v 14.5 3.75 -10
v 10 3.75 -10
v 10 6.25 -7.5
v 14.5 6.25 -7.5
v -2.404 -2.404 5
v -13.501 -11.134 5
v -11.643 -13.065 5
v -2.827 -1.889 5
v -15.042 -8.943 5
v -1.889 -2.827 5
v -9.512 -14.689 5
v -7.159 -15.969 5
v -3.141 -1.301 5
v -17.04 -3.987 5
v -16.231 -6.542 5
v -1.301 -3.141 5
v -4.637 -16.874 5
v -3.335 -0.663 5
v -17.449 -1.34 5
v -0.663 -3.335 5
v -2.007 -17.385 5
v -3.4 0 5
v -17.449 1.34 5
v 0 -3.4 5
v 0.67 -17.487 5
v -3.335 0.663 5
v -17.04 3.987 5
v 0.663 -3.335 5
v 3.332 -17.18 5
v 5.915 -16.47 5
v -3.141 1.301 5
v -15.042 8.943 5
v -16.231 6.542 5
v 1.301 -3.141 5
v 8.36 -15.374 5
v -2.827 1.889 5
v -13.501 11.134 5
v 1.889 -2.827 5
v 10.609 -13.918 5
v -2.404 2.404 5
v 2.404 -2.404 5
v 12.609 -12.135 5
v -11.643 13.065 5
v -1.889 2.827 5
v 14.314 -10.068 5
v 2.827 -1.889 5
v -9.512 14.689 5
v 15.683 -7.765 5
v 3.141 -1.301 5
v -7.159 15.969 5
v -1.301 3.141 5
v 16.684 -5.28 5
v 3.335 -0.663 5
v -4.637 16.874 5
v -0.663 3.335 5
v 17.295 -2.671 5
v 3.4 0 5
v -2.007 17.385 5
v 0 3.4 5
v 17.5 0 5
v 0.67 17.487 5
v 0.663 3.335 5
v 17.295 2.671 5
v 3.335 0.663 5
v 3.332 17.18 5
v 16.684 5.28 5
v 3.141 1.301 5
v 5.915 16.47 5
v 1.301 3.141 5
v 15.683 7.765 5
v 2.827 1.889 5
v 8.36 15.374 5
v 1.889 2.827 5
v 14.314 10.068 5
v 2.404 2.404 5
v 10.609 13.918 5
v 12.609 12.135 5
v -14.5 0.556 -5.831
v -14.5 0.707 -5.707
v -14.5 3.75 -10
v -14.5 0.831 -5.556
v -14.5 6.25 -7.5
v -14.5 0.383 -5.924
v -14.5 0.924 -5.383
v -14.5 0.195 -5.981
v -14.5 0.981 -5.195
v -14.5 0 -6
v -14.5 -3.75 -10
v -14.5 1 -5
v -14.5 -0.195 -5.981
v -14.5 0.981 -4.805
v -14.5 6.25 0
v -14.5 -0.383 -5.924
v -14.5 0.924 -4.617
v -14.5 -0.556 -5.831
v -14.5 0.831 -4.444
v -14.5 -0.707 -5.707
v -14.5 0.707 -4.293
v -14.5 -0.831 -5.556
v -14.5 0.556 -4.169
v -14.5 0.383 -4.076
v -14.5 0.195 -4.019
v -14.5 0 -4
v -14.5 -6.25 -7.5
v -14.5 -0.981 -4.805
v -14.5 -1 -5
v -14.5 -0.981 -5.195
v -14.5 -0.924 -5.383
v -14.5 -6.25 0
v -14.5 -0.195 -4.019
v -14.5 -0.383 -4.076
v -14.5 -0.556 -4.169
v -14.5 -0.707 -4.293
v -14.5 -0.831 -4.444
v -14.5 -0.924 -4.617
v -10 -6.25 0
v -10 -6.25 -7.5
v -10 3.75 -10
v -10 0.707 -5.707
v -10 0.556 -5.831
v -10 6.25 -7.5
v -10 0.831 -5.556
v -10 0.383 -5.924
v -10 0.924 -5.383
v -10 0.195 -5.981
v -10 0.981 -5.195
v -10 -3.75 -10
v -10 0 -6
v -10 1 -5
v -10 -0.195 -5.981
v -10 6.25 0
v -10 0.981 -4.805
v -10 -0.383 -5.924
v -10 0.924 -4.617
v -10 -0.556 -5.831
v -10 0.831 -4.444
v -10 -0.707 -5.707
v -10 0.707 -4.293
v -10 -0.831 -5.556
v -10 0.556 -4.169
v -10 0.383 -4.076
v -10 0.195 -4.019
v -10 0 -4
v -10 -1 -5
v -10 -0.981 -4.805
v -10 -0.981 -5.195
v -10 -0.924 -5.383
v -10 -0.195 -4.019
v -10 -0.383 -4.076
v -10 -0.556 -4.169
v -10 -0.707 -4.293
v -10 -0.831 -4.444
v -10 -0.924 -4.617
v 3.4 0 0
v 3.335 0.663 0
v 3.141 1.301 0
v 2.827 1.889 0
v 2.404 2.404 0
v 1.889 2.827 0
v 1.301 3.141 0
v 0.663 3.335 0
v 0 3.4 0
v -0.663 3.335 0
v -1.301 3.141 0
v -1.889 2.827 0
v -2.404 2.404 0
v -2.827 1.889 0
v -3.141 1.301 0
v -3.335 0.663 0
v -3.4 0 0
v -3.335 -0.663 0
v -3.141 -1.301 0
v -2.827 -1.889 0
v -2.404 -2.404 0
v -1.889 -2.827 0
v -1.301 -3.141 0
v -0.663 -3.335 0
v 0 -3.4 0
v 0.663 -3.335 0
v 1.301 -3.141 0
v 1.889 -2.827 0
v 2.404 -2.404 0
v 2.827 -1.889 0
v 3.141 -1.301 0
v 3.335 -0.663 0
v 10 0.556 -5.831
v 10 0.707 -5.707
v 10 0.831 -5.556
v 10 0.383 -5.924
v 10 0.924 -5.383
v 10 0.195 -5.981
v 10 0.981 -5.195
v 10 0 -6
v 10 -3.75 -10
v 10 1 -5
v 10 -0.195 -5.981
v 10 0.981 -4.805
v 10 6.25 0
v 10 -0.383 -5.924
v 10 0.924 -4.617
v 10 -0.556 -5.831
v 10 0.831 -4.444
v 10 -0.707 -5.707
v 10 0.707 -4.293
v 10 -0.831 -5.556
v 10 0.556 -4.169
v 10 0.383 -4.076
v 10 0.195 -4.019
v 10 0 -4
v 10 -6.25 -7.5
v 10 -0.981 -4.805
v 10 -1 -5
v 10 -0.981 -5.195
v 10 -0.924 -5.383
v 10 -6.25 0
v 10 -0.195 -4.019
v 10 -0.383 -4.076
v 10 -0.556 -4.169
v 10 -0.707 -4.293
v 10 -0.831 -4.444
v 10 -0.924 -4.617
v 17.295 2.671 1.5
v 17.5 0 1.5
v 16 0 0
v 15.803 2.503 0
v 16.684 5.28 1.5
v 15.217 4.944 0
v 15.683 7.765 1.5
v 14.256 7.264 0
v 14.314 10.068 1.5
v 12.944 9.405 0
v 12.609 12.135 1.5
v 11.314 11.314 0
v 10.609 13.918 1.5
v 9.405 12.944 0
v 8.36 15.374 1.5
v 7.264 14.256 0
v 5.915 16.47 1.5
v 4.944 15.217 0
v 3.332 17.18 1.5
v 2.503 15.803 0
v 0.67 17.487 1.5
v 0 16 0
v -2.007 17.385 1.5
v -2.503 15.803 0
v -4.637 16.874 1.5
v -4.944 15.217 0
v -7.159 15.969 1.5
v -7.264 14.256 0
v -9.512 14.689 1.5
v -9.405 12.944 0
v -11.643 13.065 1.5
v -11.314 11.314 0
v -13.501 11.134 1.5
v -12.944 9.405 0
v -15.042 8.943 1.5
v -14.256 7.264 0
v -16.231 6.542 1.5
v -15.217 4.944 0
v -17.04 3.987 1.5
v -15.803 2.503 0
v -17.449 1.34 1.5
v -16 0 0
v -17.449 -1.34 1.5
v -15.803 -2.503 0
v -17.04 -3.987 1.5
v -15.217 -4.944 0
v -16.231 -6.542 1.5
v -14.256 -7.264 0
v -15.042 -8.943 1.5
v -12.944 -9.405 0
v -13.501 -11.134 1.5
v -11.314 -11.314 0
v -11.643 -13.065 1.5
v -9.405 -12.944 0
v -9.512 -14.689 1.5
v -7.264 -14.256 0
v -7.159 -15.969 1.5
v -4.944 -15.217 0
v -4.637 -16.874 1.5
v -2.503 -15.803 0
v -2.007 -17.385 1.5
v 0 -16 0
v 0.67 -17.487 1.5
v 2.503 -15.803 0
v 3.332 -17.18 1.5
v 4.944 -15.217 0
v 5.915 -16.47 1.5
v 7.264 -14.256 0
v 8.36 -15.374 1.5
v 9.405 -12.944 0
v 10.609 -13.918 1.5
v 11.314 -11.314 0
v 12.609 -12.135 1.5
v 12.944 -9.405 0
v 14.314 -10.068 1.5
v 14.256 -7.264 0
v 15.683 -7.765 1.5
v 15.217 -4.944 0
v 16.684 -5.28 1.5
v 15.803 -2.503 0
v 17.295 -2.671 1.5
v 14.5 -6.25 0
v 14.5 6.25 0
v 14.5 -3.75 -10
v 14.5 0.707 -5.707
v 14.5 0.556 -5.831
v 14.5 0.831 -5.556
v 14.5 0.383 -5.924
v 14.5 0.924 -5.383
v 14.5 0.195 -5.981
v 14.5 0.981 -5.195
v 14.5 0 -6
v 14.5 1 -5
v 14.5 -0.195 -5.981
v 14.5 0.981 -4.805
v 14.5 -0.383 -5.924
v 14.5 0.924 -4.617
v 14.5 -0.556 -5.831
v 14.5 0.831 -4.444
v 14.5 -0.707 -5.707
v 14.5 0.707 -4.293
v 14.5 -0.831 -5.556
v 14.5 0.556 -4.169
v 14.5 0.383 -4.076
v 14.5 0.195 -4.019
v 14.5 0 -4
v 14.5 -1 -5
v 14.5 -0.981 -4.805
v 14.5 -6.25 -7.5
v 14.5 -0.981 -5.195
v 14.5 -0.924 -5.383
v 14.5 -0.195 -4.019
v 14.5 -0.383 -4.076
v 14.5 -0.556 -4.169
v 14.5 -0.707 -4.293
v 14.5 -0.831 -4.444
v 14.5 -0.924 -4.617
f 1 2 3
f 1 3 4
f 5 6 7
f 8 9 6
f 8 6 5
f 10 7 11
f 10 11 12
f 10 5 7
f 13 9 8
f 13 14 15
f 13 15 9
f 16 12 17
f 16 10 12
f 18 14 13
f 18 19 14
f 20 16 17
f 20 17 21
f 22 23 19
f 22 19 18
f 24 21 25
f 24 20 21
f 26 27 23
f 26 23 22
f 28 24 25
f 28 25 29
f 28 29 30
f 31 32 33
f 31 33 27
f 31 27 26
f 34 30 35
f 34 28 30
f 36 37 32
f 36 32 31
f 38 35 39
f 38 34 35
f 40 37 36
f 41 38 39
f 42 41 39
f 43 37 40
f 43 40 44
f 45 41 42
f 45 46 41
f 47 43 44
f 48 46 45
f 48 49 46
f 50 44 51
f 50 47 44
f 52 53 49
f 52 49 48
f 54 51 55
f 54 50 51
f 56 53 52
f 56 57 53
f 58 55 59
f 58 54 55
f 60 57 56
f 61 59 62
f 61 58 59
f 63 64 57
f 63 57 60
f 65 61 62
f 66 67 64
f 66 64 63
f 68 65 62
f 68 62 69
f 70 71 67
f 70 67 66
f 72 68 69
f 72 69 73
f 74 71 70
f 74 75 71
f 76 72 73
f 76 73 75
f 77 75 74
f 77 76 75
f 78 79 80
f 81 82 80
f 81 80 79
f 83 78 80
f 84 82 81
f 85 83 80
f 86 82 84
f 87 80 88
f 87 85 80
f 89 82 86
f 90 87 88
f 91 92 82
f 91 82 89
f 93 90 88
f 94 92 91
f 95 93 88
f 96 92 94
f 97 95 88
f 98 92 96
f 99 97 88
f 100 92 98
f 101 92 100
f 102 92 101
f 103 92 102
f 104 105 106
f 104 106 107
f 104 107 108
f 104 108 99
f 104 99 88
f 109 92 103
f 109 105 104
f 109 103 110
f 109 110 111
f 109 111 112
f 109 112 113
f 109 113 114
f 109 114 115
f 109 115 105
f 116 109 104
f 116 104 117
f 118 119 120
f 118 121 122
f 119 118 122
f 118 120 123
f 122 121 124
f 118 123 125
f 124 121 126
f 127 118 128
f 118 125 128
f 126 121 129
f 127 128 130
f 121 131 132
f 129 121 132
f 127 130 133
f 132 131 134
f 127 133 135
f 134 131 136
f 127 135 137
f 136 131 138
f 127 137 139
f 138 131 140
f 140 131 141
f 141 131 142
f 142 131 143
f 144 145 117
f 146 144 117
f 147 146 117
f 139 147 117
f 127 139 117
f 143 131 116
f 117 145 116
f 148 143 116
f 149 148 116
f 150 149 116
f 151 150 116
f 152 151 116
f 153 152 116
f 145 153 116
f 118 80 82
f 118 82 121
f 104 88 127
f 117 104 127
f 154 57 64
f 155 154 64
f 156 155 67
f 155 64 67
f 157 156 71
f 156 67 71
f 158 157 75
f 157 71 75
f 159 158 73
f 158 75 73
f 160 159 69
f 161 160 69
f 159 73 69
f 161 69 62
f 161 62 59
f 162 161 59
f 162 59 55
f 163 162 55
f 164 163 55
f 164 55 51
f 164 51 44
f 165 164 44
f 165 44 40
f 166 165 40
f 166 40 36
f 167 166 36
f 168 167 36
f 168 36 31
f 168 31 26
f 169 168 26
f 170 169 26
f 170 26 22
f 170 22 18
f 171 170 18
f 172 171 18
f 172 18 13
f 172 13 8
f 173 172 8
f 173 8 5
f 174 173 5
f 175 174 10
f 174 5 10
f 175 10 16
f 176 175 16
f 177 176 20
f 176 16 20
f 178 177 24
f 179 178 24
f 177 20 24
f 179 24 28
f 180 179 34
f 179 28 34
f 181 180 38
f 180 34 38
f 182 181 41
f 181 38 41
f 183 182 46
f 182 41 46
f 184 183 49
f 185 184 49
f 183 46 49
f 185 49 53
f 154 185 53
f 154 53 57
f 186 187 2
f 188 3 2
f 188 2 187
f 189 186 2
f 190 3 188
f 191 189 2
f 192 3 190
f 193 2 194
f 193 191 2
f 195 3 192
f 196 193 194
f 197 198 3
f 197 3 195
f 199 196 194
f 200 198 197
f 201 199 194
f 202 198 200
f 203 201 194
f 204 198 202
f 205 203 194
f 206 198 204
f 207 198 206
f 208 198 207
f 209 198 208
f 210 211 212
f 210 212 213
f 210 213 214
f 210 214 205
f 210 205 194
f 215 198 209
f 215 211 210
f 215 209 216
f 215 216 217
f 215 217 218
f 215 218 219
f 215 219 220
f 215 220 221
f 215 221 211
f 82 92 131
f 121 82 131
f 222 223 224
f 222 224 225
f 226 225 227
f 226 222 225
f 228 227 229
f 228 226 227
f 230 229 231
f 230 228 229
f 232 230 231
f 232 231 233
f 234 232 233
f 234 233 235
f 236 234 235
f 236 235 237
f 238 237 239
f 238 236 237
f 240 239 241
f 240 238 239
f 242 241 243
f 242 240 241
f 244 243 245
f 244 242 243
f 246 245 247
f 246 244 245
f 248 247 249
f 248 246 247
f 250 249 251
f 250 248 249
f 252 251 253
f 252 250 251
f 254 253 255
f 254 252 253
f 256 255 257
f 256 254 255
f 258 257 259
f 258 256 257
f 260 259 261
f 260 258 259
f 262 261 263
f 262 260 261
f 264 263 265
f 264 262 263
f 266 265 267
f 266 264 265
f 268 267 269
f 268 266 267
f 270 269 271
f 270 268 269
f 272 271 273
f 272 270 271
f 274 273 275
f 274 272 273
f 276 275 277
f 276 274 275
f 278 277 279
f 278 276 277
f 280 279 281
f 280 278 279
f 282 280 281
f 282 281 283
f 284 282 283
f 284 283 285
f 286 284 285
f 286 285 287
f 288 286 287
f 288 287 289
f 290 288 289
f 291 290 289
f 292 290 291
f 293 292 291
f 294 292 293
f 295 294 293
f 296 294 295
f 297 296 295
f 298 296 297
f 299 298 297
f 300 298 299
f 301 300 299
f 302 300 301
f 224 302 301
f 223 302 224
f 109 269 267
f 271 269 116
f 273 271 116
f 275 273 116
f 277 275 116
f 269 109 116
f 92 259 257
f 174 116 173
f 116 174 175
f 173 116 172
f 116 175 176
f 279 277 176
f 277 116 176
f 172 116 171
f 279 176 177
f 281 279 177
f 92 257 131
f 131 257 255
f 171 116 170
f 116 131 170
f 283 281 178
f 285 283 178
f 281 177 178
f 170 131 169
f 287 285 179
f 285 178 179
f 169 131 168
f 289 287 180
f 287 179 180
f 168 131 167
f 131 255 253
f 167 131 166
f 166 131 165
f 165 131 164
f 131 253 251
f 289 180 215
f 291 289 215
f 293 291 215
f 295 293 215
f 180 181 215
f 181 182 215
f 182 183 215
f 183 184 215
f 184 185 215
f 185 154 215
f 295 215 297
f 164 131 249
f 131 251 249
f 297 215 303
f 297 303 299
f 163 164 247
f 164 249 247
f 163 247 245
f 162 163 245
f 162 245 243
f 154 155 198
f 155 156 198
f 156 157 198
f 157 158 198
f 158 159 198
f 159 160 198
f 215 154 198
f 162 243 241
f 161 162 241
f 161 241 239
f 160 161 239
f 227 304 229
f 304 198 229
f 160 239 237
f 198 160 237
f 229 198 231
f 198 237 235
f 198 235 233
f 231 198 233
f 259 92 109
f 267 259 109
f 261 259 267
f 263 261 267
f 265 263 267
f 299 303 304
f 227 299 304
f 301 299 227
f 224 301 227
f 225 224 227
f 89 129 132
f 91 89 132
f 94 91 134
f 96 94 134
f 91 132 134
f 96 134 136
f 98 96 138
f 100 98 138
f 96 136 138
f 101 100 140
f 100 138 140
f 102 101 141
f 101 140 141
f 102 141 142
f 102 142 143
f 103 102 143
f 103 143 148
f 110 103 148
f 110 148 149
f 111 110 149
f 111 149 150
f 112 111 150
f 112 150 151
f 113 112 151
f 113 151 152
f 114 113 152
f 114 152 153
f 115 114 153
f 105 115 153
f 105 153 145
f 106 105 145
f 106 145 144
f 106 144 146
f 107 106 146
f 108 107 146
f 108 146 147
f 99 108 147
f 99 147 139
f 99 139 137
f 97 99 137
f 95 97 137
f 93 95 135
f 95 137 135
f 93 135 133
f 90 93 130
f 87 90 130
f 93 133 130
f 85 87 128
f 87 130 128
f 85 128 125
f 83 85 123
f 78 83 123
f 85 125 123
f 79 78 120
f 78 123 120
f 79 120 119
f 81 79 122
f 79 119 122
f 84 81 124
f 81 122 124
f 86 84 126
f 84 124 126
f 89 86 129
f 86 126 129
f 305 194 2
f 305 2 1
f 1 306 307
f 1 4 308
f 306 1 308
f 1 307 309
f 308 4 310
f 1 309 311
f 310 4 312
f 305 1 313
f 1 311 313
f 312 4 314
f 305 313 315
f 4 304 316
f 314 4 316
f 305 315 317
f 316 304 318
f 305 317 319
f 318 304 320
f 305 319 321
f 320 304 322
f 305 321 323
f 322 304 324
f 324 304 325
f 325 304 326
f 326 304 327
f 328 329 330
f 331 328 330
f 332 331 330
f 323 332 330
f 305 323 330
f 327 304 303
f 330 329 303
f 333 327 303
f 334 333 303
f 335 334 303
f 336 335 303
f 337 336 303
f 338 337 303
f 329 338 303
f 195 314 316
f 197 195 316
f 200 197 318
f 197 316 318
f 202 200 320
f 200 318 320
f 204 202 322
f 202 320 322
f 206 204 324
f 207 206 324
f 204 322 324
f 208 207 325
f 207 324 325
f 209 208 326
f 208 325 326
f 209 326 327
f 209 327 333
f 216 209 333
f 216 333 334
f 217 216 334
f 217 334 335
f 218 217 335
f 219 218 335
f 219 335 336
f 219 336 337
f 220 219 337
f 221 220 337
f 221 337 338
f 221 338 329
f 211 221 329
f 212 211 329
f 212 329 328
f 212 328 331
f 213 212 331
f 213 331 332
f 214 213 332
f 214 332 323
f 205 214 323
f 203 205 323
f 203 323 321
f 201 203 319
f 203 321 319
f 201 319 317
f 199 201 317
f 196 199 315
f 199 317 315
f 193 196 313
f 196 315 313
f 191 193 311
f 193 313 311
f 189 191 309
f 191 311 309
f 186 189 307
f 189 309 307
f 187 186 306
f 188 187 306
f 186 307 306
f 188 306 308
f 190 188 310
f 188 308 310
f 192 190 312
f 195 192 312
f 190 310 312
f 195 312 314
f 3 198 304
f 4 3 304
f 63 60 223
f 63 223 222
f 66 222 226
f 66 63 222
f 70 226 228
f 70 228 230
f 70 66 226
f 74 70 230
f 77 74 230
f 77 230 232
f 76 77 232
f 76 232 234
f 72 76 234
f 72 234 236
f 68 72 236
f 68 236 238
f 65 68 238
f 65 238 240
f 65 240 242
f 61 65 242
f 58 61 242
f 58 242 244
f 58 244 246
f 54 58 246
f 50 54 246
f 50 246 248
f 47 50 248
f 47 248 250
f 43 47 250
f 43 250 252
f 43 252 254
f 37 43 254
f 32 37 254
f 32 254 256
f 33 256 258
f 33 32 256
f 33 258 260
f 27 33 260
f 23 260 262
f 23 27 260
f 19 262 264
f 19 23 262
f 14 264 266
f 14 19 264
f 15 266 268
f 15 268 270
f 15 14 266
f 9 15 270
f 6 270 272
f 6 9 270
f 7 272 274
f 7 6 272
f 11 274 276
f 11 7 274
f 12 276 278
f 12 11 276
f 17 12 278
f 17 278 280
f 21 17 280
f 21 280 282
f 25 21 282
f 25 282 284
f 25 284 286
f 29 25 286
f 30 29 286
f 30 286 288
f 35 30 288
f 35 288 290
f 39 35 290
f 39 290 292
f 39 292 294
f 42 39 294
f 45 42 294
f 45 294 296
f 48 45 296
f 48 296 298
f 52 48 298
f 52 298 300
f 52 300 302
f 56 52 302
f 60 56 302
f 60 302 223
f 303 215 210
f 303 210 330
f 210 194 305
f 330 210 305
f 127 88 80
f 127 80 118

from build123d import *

# Parameters (mm, degrees)
F1_DEPTH  = 5
F3_SIZE   = 1
F2_W      = 4.5
F2_H      = 12.5
F4_DEPTH  = 10
F5_SIZE   = 2.5
F6_R      = 1
F7_DEPTH  = 39.5010001
F8_R      = 39.5864097355
F8_R_2    = 17.5
F9_DEPTH  = 25
F10_SIZE  = 1.5
F11_R     = 3.4
F12_DEPTH = 25


with BuildPart() as f1:
    # F0 (on Top) → F1 (new body)
    with BuildSketch(Plane.XY):
        with BuildLine():
            ThreePointArc((19.8625961196, -15.8301909188), (23.6080012184, -12.5093598908), (25, -7.7012087429))
            Line((25, -7.7012087429), (25, 7.7012087429))
            ThreePointArc((25, 7.7012087429), (23.6080012184, 12.5093598908), (19.8625961196, 15.8301909188))
            add(Edge.make_bspline(
                [(19.8625961196, 15.8301909188), (0, 25.2681728257), (-19.8625961196, 15.8301909188)],
                knots=[0.9132750433, 0.9132750433, 0.9132750433, 2.2283176103, 2.2283176103, 2.2283176103], degree=2, weights=[1, 0.7915095459, 1]))
            ThreePointArc((-19.8625961196, 15.8301909188), (-23.6080012184, 12.5093598908), (-25, 7.7012087429))
            Line((-25, 7.7012087429), (-25, -7.7012087429))
            ThreePointArc((-25, -7.7012087429), (-23.6080012184, -12.5093598908), (-19.8625961196, -15.8301909188))
            add(Edge.make_bspline(
                [(-19.8625961196, -15.8301909188), (0, -25.2681728257), (19.8625961196, -15.8301909188)],
                knots=[4.0548676969, 4.0548676969, 4.0548676969, 5.3699102639, 5.3699102639, 5.3699102639], degree=2, weights=[1, 0.7915095459, 1]))
        make_face()
    extrude(amount=F1_DEPTH)

    # F3
    f3_edges = [f1.edges().sort_by_distance(p)[0] for p in [
        (4e-06, -20, 0),
    ]]
    chamfer(f3_edges, length=F3_SIZE)

    # F2 (on face) → F4 (join)
    with BuildSketch(Plane(origin=(0, 0, 0), x_dir=(1, 0, 0), z_dir=(0, 0, -1))):
        with Locations((12.25, 0)):
            Rectangle(F2_W, F2_H)
        with Locations((-12.25, 0)):
            Rectangle(F2_W, F2_H)
    extrude(amount=F4_DEPTH)

    # F5
    f5_edges = [f1.edges().sort_by_distance(p)[0] for p in [
        (-12.25, -6.25, -10),
        (12.25, -6.25, -10),
        (-12.25, 6.25, -10),
        (12.25, 6.25, -10),
    ]]
    chamfer(f5_edges, length=F5_SIZE)

    # F6 (on face) → F7 (cut, through all)
    with BuildSketch(Plane.YZ.offset(14.5)):
        with Locations((0, -5)):
            Circle(F6_R)
    extrude(amount=-F7_DEPTH, mode=Mode.SUBTRACT)

    # F8 (on face) → F9 (cut)
    with BuildSketch(Plane.XY.offset(5)):
        Circle(F8_R)
        with BuildLine():
            add(Edge.make_bspline(
                [(-19.8625961196, -15.8301909188), (0, -25.2681728257), (19.8625961196, -15.8301909188)],
                knots=[4.0548676969, 4.0548676969, 4.0548676969, 5.3699102639, 5.3699102639, 5.3699102639], degree=2, weights=[1, 0.7915095459, 1]))
            ThreePointArc((-19.8625961196, -15.8301909188), (-23.6080012184, -12.5093598908), (-25, -7.7012087429))
            Line((-25, -7.7012087429), (-25, 7.7012087429))
            ThreePointArc((-25, 7.7012087429), (-23.6080012184, 12.5093598908), (-19.8625961196, 15.8301909188))
            add(Edge.make_bspline(
                [(19.8625961196, 15.8301909188), (0, 25.2681728257), (-19.8625961196, 15.8301909188)],
                knots=[0.9132750433, 0.9132750433, 0.9132750433, 2.2283176103, 2.2283176103, 2.2283176103], degree=2, weights=[1, 0.7915095459, 1]))
            ThreePointArc((19.8625961196, 15.8301909188), (23.6080012184, 12.5093598908), (25, 7.7012087429))
            Line((25, 7.7012087429), (25, -7.7012087429))
            ThreePointArc((25, -7.7012087429), (23.6080012184, -12.5093598908), (19.8625961196, -15.8301909188))
        make_face(mode=Mode.SUBTRACT)
        with BuildLine():
            ThreePointArc((-25, -7.7012087429), (-23.6080012184, -12.5093598908), (-19.8625961196, -15.8301909188))
            add(Edge.make_bspline(
                [(-19.8625961196, -15.8301909188), (0, -25.2681728257), (19.8625961196, -15.8301909188)],
                knots=[4.0548676969, 4.0548676969, 4.0548676969, 5.3699102639, 5.3699102639, 5.3699102639], degree=2, weights=[1, 0.7915095459, 1]))
            ThreePointArc((19.8625961196, -15.8301909188), (23.6080012184, -12.5093598908), (25, -7.7012087429))
            Line((25, -7.7012087429), (25, 7.7012087429))
            ThreePointArc((25, 7.7012087429), (23.6080012184, 12.5093598908), (19.8625961196, 15.8301909188))
            add(Edge.make_bspline(
                [(19.8625961196, 15.8301909188), (0, 25.2681728257), (-19.8625961196, 15.8301909188)],
                knots=[0.9132750433, 0.9132750433, 0.9132750433, 2.2283176103, 2.2283176103, 2.2283176103], degree=2, weights=[1, 0.7915095459, 1]))
            ThreePointArc((-19.8625961196, 15.8301909188), (-23.6080012184, 12.5093598908), (-25, 7.7012087429))
            Line((-25, 7.7012087429), (-25, -7.7012087429))
        make_face()
        Circle(F8_R_2, mode=Mode.SUBTRACT)
    extrude(amount=-F9_DEPTH, mode=Mode.SUBTRACT)

    # F10
    f10_edges = [f1.edges().sort_by_distance(p)[0] for p in [
        (-17.5, 0, 0),
    ]]
    chamfer(f10_edges, length=F10_SIZE)

    # F11 (on face) → F12 (cut)
    with BuildSketch(Plane.XY.offset(5)):
        Circle(F11_R)
    extrude(amount=-F12_DEPTH, mode=Mode.SUBTRACT)


solid = f1.part
